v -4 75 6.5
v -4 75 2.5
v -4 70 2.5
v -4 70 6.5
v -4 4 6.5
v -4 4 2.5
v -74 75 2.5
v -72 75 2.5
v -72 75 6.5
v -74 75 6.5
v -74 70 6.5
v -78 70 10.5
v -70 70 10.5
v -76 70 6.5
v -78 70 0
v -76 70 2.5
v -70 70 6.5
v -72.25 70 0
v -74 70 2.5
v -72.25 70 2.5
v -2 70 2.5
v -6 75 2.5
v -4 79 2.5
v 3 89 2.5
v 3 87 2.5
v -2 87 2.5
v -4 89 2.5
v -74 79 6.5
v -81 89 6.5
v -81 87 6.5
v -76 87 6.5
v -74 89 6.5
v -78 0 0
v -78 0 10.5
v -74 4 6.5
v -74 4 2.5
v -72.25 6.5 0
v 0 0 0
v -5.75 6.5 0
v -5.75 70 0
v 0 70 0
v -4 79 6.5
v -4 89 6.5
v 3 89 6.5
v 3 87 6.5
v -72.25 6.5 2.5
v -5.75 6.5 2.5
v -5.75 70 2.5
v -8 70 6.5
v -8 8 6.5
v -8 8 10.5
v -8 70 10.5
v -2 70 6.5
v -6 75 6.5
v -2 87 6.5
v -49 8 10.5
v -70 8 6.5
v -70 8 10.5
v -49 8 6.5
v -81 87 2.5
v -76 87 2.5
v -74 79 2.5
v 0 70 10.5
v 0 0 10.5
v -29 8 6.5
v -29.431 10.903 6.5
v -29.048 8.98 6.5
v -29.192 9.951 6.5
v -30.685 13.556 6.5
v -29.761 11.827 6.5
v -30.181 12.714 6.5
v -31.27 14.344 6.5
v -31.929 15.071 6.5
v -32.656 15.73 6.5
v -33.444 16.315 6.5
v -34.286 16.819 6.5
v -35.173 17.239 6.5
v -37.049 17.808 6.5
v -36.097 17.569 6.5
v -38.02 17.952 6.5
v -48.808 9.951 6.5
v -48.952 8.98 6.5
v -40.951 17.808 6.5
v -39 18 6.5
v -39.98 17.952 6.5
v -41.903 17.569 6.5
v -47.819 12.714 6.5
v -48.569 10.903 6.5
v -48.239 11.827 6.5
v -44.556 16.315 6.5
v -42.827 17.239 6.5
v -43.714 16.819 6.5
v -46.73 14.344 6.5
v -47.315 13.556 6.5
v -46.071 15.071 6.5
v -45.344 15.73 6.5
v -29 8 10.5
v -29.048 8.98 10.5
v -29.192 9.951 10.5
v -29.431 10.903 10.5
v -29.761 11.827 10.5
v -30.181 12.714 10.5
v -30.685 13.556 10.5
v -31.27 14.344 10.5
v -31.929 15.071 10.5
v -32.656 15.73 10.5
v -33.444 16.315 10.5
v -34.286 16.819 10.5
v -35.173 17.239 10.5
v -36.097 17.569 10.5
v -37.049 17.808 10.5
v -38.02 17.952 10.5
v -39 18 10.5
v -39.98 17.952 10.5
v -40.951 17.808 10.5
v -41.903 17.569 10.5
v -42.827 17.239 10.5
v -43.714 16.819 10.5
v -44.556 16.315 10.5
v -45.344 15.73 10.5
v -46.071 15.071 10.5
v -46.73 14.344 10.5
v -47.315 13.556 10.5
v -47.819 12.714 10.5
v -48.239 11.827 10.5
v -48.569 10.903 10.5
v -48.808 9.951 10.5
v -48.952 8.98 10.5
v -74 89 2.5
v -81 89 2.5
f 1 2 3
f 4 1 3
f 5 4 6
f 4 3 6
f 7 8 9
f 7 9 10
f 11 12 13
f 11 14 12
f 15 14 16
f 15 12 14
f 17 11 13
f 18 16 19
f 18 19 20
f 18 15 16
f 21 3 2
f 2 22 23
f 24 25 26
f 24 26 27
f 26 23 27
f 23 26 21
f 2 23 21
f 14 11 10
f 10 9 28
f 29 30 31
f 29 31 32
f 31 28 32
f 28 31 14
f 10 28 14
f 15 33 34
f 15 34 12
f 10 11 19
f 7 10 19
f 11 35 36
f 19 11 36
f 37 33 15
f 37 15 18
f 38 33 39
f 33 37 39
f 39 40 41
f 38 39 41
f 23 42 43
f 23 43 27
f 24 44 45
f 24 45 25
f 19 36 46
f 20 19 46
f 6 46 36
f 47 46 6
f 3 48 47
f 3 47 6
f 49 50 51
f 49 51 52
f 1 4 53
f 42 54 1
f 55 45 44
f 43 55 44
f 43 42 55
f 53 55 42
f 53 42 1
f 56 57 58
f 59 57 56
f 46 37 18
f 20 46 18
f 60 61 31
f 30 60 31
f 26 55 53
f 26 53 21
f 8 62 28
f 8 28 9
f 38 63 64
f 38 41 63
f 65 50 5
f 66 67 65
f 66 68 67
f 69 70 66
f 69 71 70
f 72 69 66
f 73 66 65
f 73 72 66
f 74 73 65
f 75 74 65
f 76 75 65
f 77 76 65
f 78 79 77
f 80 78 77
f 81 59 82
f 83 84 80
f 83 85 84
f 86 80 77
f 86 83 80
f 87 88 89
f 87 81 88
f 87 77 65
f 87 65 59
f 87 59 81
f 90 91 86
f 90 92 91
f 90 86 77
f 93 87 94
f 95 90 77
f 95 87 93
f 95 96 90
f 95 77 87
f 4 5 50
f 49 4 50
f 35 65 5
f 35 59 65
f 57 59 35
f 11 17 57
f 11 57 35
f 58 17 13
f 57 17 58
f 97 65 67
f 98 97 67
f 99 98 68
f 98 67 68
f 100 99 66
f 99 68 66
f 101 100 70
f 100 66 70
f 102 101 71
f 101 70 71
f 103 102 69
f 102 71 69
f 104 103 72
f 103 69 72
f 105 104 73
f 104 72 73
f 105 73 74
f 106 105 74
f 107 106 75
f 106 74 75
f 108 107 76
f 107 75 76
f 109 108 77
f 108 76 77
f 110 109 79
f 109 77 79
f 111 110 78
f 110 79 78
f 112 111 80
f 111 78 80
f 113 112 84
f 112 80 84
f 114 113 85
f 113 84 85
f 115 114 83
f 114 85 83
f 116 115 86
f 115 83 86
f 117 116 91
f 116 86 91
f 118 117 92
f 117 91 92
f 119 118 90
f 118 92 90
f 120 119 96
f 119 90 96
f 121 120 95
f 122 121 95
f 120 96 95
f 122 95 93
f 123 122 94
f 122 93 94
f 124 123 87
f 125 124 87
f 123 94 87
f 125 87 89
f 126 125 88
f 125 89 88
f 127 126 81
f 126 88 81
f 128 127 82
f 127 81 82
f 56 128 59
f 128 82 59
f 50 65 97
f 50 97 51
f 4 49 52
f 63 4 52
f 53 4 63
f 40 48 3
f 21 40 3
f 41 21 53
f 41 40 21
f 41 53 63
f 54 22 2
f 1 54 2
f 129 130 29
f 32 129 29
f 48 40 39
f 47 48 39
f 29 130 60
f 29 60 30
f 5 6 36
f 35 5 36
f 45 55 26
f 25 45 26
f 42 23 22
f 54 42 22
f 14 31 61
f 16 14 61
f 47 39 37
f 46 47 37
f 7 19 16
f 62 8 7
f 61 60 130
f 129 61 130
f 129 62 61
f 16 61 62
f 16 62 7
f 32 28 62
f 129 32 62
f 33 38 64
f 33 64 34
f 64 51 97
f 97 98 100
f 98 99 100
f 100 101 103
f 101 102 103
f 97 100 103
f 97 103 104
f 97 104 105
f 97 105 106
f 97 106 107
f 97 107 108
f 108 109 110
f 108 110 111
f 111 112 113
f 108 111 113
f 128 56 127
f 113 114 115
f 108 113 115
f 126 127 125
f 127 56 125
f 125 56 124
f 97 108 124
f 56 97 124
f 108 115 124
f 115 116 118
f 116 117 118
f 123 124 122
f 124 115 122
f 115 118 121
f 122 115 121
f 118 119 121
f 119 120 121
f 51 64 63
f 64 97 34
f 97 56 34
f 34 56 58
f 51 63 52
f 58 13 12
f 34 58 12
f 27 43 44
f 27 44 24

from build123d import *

# Parameters (mm, degrees)
BOSS_EXTRU_1_DEPTH = 6.5
BOSS_EXTRU_2_DEPTH = 2.5
ESQUISSE3_W        = 2
ESQUISSE3_H        = 4
BOSS_EXTRU_3_DEPTH = 9
BOSS_EXTRU_4_START = -4
BOSS_EXTRU_4_DEPTH = 4
BOSS_EXTRU_5_DEPTH = 4
ESQUISSE6_W        = 2
ESQUISSE6_H        = 4
BOSS_EXTRU_6_DEPTH = 10
ESQUISSE7_W        = 4
ESQUISSE7_H        = 2
BOSS_EXTRU_7_DEPTH = 5
ESQUISSE8_W        = 4
ESQUISSE8_H        = 2
BOSS_EXTRU_8_DEPTH = 5
BOSS_EXTRU_9_START = -4
BOSS_EXTRU_9_DEPTH = 4


with BuildPart() as part:
    # Esquisse1 → Boss.-Extru.1 (new body)
    with BuildSketch(Plane.XY):
        Polygon((-74, 4), (-74, 70), (-78, 70), (-78, 0), (0, 0), (0, 70), (-4, 70), (-4, 4), align=None)
    extrude(amount=BOSS_EXTRU_1_DEPTH)

    # Esquisse2 → Boss.-Extru.2 (add)
    with BuildSketch(Plane(origin=(0, 0, 0), x_dir=(-1, 0, 0), z_dir=(0, 0, -1))):
        Polygon((0, 70), (5.75, 70), (5.75, 6.5), (72.25, 6.5), (72.25, 70), (78, 70), (78, 0), (0, 0), align=None)
    extrude(amount=-BOSS_EXTRU_2_DEPTH)

    # Esquisse3 → Boss.-Extru.3 (add)
    with BuildSketch(Plane(origin=(0, 70, 0), x_dir=(1, 0, 0), z_dir=(0, 1, 0))):
        with Locations((-75, -4.5)):
            Rectangle(ESQUISSE3_W, ESQUISSE3_H)
        with Locations((-3, -4.5)):
            Rectangle(ESQUISSE3_W, ESQUISSE3_H)
    extrude(amount=BOSS_EXTRU_3_DEPTH)

    # Esquisse4 → Boss.-Extru.4 (add)
    with BuildSketch(Plane.XY.offset(6.5).offset(BOSS_EXTRU_4_START)):
        Polygon((-4, 79), (-6, 75), (-4, 75), align=None)
        Polygon((-74, 79), (-72, 75), (-74, 75), align=None)
    extrude(amount=BOSS_EXTRU_4_DEPTH)

    # Esquisse5 → Boss.-Extru.5 (add)
    with BuildSketch(Plane.XY.offset(6.5)):
        Polygon((0, 70), (0, 0), (-78, 0), (-78, 70), (-70, 70), (-70, 8), (-8, 8), (-8, 70), align=None)
    extrude(amount=BOSS_EXTRU_5_DEPTH)

    # Esquisse6 → Boss.-Extru.6 (add)
    with BuildSketch(Plane(origin=(0, 79, 0), x_dir=(1, 0, 0), z_dir=(0, 1, 0))):
        with Locations((-3, -4.5)):
            Rectangle(ESQUISSE6_W, ESQUISSE6_H)
        with Locations((-75, -4.5)):
            Rectangle(ESQUISSE6_W, ESQUISSE6_H)
    extrude(amount=BOSS_EXTRU_6_DEPTH)

    # Esquisse7 → Boss.-Extru.7 (add)
    with BuildSketch(Plane(origin=(-2, 0, 0), x_dir=(0, 0, -1), z_dir=(1, 0, 0))):
        with Locations((-4.5, 88)):
            Rectangle(ESQUISSE7_W, ESQUISSE7_H)
    extrude(amount=BOSS_EXTRU_7_DEPTH)

    # Esquisse8 → Boss.-Extru.8 (add)
    with BuildSketch(Plane.ZY.offset(76)):
        with Locations((4.5, 88)):
            Rectangle(ESQUISSE8_W, ESQUISSE8_H)
    extrude(amount=BOSS_EXTRU_8_DEPTH)

    # Esquisse9 → Boss.-Extru.9 (add)
    with BuildSketch(Plane.XY.offset(10.5).offset(BOSS_EXTRU_9_START)):
        with BuildLine():
            Line((-49, 8), (-29, 8))
            ThreePointArc((-29, 8), (-39, 18), (-49, 8))
        make_face()
    extrude(amount=BOSS_EXTRU_9_DEPTH)


solid = part.part
